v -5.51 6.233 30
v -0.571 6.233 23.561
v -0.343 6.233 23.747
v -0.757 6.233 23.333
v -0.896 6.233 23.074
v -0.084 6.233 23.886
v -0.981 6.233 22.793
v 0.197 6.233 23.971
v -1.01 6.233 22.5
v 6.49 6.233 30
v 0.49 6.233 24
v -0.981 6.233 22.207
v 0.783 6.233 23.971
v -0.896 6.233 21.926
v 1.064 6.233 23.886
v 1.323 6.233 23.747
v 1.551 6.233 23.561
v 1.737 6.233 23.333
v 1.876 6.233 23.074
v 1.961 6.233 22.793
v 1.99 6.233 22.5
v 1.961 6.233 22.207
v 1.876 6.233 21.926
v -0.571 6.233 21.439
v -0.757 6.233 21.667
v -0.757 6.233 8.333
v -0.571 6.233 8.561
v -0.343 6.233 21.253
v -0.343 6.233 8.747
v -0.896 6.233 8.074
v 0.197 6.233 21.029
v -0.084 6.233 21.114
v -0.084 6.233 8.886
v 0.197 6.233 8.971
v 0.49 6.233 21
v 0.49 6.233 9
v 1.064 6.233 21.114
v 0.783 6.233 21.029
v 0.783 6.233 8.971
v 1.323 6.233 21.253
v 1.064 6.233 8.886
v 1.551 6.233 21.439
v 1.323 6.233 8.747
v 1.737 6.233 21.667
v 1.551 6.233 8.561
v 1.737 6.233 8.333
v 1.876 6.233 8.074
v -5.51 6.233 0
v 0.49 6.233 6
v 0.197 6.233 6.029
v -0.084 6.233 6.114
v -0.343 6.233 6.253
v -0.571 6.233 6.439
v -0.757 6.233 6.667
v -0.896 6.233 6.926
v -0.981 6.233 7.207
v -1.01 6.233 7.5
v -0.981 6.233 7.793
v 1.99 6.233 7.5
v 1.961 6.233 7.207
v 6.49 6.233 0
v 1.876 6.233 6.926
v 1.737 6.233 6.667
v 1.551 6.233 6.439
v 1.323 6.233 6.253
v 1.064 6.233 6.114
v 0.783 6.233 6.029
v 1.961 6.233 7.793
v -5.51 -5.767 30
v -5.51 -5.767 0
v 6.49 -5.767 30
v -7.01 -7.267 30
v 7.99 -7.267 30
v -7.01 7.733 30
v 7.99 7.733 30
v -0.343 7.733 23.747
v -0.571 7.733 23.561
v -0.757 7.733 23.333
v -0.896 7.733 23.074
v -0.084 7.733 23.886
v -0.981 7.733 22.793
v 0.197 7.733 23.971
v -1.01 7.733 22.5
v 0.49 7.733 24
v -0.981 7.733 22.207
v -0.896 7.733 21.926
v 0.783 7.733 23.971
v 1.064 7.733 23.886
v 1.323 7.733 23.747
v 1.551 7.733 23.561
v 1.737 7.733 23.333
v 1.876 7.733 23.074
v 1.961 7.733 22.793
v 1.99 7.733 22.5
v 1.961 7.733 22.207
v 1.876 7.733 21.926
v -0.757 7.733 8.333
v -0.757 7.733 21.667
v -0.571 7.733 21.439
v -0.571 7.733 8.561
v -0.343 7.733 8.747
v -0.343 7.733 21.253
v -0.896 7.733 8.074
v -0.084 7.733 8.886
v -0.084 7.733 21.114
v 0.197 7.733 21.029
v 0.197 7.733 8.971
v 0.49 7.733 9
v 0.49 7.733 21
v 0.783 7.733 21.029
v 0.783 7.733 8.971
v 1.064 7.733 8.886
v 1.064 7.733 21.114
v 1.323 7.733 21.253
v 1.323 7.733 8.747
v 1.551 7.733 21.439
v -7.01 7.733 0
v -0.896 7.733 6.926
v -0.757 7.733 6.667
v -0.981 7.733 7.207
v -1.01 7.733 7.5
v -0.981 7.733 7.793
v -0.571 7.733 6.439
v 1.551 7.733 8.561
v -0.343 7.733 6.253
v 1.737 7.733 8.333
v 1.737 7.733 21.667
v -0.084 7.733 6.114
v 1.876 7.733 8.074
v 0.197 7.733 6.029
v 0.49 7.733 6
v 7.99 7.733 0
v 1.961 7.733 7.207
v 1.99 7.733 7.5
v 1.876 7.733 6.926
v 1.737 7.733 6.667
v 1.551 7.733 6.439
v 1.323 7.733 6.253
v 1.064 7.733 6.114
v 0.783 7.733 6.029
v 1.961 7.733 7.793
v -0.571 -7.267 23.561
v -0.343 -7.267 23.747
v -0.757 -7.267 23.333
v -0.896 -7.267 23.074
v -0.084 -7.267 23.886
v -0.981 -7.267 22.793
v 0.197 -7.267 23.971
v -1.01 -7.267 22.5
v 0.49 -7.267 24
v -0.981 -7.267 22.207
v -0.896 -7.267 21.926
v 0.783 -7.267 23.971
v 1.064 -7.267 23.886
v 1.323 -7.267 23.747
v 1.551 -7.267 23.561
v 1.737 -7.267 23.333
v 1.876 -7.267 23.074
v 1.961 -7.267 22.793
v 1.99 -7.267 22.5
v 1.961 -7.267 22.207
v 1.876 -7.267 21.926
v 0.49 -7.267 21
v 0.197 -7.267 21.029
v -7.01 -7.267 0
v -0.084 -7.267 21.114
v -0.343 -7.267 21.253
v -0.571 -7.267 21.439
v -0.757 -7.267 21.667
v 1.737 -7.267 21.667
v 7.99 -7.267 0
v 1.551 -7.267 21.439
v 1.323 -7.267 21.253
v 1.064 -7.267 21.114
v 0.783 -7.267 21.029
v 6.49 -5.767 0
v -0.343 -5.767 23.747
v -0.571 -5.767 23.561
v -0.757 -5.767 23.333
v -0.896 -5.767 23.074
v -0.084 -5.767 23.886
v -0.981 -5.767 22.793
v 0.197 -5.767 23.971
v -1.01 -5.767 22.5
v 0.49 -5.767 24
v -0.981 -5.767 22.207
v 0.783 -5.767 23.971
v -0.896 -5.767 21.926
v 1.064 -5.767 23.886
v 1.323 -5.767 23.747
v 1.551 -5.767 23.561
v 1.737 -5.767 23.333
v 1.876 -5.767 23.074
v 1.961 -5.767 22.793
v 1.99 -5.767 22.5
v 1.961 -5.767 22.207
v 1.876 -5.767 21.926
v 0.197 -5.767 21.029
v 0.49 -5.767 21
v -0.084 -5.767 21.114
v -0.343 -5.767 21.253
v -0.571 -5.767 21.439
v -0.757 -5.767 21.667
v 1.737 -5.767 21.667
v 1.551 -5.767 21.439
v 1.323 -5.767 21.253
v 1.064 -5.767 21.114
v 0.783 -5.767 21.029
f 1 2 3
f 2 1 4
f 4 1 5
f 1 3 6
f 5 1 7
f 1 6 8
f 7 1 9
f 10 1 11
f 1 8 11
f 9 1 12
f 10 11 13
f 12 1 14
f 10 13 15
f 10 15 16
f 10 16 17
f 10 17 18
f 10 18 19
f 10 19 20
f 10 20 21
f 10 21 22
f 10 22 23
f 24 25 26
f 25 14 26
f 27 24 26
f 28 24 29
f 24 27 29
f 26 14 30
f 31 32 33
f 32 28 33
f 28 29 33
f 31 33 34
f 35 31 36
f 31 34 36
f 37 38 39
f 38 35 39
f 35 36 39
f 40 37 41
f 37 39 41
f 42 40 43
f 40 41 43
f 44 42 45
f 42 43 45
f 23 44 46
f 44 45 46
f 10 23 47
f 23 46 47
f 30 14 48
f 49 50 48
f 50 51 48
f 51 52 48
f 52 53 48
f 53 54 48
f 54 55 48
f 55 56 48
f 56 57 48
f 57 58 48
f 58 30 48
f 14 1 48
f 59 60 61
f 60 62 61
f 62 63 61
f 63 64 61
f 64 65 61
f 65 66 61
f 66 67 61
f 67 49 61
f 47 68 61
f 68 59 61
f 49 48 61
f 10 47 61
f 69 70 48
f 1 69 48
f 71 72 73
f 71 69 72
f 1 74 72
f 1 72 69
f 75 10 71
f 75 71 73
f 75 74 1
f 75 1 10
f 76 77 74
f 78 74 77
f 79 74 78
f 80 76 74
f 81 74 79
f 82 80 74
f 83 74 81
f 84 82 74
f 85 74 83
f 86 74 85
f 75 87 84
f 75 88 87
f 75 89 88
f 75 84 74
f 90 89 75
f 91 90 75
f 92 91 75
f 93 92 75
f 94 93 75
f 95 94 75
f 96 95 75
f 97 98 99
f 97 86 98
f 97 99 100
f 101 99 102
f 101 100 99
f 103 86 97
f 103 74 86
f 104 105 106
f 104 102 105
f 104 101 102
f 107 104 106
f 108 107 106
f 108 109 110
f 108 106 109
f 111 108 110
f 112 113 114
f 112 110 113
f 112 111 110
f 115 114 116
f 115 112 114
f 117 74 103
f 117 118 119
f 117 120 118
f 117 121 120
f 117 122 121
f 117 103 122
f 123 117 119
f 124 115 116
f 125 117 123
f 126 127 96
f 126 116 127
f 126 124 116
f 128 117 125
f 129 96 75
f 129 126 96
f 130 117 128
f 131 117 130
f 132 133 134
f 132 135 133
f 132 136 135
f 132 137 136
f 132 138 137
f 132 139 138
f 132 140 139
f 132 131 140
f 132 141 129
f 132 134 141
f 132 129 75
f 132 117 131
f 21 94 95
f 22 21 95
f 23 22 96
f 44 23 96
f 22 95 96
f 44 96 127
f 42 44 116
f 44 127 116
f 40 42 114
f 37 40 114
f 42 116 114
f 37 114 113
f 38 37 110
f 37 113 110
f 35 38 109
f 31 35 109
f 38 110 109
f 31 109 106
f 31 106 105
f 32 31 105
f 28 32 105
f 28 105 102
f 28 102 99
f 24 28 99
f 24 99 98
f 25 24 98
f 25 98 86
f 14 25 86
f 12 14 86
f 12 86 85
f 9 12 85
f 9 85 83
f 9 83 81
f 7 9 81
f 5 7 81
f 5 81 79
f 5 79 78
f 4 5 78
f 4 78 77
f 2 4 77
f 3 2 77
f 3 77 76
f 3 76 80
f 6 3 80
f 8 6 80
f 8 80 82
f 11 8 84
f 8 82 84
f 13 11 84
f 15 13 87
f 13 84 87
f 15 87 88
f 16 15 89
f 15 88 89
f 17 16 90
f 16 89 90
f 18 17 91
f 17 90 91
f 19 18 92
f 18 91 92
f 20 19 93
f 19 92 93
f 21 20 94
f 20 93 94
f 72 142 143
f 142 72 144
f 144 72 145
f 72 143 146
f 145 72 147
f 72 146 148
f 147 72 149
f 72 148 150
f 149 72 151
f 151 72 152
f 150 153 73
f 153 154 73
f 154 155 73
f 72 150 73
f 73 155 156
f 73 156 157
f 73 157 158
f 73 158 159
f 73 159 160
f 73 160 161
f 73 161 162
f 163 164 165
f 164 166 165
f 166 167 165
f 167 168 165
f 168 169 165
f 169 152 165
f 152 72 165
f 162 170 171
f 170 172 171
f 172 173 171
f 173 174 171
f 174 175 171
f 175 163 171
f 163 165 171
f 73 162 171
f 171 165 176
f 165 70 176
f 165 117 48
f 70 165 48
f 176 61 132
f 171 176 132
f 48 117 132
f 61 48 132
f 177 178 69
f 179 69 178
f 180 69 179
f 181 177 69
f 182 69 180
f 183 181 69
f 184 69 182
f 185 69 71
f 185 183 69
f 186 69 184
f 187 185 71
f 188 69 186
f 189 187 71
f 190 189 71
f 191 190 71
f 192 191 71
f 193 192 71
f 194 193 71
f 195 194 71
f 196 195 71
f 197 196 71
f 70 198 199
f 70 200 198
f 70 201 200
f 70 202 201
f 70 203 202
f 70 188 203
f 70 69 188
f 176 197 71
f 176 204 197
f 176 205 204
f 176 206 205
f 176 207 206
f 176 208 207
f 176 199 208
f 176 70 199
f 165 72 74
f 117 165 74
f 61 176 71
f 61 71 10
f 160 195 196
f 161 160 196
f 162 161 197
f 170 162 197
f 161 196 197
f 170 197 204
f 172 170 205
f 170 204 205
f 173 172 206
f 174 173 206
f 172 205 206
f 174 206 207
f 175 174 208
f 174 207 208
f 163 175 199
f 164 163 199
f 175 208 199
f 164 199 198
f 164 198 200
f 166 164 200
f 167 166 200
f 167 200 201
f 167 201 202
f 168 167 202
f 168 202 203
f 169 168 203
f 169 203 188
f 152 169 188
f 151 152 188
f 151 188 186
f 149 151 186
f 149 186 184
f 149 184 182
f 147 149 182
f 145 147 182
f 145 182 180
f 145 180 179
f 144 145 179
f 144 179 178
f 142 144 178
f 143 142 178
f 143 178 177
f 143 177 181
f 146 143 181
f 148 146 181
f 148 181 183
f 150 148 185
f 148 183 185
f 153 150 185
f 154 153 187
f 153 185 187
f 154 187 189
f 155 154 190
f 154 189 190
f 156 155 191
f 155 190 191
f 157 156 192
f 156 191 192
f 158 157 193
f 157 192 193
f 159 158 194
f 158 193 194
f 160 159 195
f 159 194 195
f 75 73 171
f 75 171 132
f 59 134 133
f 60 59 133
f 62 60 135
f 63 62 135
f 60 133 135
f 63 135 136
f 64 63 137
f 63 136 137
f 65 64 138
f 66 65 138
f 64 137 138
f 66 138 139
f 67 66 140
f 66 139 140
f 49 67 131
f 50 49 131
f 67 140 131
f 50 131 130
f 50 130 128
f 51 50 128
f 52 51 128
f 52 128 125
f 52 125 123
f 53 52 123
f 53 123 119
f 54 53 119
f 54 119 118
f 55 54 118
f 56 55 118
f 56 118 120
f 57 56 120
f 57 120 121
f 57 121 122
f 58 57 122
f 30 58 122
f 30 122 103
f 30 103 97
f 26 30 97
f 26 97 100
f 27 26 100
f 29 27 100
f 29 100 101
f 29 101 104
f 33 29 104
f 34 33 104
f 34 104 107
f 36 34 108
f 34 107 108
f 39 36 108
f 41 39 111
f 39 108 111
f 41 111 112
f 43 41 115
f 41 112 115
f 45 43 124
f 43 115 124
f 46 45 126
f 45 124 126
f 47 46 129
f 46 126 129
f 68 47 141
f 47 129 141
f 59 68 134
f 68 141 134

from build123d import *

# Parameters (mm, degrees)
SKETCH_1_W          = 15
SKETCH_1_H          = 15
SKETCH_1_W_2        = 12
SKETCH_1_H_2        = 12
EXTRUDE_2_DEPTH     = 30
SKETCH_2_R          = 1.5
CUT_EXTRUDE_1_DEPTH = 20
SKETCH_3_R          = 1.5
CUT_EXTRUDE_2_DEPTH = 10


with BuildPart() as part:
    # ｽｹｯﾁ1 → ﾎﾞｽ - 押し出し2 (new body)
    with BuildSketch(Plane.XY):
        with Locations((0.489915859, 0.232626086)):
            Rectangle(SKETCH_1_W, SKETCH_1_H)
        with Locations((0.489915859, 0.232626086)):
            Rectangle(SKETCH_1_W_2, SKETCH_1_H_2, mode=Mode.SUBTRACT)
    extrude(amount=EXTRUDE_2_DEPTH)

    # ｽｹｯﾁ2 → ｶｯﾄ - 押し出し1 (cut)
    with BuildSketch(Plane(origin=(0, 7.732626086, 0), x_dir=(1, 0, 0), z_dir=(0, 1, 0))):
        with Locations((0.489915859, -22.5)):
            Circle(SKETCH_2_R)
    extrude(amount=-CUT_EXTRUDE_1_DEPTH, mode=Mode.SUBTRACT)

    # ｽｹｯﾁ3 → ｶｯﾄ - 押し出し2 (cut)
    with BuildSketch(Plane(origin=(0, 7.732626086, 0), x_dir=(1, 0, 0), z_dir=(0, 1, 0))):
        with Locations((0.489915859, -7.5)):
            Circle(SKETCH_3_R)
    extrude(amount=-CUT_EXTRUDE_2_DEPTH, mode=Mode.SUBTRACT)


solid = part.part
